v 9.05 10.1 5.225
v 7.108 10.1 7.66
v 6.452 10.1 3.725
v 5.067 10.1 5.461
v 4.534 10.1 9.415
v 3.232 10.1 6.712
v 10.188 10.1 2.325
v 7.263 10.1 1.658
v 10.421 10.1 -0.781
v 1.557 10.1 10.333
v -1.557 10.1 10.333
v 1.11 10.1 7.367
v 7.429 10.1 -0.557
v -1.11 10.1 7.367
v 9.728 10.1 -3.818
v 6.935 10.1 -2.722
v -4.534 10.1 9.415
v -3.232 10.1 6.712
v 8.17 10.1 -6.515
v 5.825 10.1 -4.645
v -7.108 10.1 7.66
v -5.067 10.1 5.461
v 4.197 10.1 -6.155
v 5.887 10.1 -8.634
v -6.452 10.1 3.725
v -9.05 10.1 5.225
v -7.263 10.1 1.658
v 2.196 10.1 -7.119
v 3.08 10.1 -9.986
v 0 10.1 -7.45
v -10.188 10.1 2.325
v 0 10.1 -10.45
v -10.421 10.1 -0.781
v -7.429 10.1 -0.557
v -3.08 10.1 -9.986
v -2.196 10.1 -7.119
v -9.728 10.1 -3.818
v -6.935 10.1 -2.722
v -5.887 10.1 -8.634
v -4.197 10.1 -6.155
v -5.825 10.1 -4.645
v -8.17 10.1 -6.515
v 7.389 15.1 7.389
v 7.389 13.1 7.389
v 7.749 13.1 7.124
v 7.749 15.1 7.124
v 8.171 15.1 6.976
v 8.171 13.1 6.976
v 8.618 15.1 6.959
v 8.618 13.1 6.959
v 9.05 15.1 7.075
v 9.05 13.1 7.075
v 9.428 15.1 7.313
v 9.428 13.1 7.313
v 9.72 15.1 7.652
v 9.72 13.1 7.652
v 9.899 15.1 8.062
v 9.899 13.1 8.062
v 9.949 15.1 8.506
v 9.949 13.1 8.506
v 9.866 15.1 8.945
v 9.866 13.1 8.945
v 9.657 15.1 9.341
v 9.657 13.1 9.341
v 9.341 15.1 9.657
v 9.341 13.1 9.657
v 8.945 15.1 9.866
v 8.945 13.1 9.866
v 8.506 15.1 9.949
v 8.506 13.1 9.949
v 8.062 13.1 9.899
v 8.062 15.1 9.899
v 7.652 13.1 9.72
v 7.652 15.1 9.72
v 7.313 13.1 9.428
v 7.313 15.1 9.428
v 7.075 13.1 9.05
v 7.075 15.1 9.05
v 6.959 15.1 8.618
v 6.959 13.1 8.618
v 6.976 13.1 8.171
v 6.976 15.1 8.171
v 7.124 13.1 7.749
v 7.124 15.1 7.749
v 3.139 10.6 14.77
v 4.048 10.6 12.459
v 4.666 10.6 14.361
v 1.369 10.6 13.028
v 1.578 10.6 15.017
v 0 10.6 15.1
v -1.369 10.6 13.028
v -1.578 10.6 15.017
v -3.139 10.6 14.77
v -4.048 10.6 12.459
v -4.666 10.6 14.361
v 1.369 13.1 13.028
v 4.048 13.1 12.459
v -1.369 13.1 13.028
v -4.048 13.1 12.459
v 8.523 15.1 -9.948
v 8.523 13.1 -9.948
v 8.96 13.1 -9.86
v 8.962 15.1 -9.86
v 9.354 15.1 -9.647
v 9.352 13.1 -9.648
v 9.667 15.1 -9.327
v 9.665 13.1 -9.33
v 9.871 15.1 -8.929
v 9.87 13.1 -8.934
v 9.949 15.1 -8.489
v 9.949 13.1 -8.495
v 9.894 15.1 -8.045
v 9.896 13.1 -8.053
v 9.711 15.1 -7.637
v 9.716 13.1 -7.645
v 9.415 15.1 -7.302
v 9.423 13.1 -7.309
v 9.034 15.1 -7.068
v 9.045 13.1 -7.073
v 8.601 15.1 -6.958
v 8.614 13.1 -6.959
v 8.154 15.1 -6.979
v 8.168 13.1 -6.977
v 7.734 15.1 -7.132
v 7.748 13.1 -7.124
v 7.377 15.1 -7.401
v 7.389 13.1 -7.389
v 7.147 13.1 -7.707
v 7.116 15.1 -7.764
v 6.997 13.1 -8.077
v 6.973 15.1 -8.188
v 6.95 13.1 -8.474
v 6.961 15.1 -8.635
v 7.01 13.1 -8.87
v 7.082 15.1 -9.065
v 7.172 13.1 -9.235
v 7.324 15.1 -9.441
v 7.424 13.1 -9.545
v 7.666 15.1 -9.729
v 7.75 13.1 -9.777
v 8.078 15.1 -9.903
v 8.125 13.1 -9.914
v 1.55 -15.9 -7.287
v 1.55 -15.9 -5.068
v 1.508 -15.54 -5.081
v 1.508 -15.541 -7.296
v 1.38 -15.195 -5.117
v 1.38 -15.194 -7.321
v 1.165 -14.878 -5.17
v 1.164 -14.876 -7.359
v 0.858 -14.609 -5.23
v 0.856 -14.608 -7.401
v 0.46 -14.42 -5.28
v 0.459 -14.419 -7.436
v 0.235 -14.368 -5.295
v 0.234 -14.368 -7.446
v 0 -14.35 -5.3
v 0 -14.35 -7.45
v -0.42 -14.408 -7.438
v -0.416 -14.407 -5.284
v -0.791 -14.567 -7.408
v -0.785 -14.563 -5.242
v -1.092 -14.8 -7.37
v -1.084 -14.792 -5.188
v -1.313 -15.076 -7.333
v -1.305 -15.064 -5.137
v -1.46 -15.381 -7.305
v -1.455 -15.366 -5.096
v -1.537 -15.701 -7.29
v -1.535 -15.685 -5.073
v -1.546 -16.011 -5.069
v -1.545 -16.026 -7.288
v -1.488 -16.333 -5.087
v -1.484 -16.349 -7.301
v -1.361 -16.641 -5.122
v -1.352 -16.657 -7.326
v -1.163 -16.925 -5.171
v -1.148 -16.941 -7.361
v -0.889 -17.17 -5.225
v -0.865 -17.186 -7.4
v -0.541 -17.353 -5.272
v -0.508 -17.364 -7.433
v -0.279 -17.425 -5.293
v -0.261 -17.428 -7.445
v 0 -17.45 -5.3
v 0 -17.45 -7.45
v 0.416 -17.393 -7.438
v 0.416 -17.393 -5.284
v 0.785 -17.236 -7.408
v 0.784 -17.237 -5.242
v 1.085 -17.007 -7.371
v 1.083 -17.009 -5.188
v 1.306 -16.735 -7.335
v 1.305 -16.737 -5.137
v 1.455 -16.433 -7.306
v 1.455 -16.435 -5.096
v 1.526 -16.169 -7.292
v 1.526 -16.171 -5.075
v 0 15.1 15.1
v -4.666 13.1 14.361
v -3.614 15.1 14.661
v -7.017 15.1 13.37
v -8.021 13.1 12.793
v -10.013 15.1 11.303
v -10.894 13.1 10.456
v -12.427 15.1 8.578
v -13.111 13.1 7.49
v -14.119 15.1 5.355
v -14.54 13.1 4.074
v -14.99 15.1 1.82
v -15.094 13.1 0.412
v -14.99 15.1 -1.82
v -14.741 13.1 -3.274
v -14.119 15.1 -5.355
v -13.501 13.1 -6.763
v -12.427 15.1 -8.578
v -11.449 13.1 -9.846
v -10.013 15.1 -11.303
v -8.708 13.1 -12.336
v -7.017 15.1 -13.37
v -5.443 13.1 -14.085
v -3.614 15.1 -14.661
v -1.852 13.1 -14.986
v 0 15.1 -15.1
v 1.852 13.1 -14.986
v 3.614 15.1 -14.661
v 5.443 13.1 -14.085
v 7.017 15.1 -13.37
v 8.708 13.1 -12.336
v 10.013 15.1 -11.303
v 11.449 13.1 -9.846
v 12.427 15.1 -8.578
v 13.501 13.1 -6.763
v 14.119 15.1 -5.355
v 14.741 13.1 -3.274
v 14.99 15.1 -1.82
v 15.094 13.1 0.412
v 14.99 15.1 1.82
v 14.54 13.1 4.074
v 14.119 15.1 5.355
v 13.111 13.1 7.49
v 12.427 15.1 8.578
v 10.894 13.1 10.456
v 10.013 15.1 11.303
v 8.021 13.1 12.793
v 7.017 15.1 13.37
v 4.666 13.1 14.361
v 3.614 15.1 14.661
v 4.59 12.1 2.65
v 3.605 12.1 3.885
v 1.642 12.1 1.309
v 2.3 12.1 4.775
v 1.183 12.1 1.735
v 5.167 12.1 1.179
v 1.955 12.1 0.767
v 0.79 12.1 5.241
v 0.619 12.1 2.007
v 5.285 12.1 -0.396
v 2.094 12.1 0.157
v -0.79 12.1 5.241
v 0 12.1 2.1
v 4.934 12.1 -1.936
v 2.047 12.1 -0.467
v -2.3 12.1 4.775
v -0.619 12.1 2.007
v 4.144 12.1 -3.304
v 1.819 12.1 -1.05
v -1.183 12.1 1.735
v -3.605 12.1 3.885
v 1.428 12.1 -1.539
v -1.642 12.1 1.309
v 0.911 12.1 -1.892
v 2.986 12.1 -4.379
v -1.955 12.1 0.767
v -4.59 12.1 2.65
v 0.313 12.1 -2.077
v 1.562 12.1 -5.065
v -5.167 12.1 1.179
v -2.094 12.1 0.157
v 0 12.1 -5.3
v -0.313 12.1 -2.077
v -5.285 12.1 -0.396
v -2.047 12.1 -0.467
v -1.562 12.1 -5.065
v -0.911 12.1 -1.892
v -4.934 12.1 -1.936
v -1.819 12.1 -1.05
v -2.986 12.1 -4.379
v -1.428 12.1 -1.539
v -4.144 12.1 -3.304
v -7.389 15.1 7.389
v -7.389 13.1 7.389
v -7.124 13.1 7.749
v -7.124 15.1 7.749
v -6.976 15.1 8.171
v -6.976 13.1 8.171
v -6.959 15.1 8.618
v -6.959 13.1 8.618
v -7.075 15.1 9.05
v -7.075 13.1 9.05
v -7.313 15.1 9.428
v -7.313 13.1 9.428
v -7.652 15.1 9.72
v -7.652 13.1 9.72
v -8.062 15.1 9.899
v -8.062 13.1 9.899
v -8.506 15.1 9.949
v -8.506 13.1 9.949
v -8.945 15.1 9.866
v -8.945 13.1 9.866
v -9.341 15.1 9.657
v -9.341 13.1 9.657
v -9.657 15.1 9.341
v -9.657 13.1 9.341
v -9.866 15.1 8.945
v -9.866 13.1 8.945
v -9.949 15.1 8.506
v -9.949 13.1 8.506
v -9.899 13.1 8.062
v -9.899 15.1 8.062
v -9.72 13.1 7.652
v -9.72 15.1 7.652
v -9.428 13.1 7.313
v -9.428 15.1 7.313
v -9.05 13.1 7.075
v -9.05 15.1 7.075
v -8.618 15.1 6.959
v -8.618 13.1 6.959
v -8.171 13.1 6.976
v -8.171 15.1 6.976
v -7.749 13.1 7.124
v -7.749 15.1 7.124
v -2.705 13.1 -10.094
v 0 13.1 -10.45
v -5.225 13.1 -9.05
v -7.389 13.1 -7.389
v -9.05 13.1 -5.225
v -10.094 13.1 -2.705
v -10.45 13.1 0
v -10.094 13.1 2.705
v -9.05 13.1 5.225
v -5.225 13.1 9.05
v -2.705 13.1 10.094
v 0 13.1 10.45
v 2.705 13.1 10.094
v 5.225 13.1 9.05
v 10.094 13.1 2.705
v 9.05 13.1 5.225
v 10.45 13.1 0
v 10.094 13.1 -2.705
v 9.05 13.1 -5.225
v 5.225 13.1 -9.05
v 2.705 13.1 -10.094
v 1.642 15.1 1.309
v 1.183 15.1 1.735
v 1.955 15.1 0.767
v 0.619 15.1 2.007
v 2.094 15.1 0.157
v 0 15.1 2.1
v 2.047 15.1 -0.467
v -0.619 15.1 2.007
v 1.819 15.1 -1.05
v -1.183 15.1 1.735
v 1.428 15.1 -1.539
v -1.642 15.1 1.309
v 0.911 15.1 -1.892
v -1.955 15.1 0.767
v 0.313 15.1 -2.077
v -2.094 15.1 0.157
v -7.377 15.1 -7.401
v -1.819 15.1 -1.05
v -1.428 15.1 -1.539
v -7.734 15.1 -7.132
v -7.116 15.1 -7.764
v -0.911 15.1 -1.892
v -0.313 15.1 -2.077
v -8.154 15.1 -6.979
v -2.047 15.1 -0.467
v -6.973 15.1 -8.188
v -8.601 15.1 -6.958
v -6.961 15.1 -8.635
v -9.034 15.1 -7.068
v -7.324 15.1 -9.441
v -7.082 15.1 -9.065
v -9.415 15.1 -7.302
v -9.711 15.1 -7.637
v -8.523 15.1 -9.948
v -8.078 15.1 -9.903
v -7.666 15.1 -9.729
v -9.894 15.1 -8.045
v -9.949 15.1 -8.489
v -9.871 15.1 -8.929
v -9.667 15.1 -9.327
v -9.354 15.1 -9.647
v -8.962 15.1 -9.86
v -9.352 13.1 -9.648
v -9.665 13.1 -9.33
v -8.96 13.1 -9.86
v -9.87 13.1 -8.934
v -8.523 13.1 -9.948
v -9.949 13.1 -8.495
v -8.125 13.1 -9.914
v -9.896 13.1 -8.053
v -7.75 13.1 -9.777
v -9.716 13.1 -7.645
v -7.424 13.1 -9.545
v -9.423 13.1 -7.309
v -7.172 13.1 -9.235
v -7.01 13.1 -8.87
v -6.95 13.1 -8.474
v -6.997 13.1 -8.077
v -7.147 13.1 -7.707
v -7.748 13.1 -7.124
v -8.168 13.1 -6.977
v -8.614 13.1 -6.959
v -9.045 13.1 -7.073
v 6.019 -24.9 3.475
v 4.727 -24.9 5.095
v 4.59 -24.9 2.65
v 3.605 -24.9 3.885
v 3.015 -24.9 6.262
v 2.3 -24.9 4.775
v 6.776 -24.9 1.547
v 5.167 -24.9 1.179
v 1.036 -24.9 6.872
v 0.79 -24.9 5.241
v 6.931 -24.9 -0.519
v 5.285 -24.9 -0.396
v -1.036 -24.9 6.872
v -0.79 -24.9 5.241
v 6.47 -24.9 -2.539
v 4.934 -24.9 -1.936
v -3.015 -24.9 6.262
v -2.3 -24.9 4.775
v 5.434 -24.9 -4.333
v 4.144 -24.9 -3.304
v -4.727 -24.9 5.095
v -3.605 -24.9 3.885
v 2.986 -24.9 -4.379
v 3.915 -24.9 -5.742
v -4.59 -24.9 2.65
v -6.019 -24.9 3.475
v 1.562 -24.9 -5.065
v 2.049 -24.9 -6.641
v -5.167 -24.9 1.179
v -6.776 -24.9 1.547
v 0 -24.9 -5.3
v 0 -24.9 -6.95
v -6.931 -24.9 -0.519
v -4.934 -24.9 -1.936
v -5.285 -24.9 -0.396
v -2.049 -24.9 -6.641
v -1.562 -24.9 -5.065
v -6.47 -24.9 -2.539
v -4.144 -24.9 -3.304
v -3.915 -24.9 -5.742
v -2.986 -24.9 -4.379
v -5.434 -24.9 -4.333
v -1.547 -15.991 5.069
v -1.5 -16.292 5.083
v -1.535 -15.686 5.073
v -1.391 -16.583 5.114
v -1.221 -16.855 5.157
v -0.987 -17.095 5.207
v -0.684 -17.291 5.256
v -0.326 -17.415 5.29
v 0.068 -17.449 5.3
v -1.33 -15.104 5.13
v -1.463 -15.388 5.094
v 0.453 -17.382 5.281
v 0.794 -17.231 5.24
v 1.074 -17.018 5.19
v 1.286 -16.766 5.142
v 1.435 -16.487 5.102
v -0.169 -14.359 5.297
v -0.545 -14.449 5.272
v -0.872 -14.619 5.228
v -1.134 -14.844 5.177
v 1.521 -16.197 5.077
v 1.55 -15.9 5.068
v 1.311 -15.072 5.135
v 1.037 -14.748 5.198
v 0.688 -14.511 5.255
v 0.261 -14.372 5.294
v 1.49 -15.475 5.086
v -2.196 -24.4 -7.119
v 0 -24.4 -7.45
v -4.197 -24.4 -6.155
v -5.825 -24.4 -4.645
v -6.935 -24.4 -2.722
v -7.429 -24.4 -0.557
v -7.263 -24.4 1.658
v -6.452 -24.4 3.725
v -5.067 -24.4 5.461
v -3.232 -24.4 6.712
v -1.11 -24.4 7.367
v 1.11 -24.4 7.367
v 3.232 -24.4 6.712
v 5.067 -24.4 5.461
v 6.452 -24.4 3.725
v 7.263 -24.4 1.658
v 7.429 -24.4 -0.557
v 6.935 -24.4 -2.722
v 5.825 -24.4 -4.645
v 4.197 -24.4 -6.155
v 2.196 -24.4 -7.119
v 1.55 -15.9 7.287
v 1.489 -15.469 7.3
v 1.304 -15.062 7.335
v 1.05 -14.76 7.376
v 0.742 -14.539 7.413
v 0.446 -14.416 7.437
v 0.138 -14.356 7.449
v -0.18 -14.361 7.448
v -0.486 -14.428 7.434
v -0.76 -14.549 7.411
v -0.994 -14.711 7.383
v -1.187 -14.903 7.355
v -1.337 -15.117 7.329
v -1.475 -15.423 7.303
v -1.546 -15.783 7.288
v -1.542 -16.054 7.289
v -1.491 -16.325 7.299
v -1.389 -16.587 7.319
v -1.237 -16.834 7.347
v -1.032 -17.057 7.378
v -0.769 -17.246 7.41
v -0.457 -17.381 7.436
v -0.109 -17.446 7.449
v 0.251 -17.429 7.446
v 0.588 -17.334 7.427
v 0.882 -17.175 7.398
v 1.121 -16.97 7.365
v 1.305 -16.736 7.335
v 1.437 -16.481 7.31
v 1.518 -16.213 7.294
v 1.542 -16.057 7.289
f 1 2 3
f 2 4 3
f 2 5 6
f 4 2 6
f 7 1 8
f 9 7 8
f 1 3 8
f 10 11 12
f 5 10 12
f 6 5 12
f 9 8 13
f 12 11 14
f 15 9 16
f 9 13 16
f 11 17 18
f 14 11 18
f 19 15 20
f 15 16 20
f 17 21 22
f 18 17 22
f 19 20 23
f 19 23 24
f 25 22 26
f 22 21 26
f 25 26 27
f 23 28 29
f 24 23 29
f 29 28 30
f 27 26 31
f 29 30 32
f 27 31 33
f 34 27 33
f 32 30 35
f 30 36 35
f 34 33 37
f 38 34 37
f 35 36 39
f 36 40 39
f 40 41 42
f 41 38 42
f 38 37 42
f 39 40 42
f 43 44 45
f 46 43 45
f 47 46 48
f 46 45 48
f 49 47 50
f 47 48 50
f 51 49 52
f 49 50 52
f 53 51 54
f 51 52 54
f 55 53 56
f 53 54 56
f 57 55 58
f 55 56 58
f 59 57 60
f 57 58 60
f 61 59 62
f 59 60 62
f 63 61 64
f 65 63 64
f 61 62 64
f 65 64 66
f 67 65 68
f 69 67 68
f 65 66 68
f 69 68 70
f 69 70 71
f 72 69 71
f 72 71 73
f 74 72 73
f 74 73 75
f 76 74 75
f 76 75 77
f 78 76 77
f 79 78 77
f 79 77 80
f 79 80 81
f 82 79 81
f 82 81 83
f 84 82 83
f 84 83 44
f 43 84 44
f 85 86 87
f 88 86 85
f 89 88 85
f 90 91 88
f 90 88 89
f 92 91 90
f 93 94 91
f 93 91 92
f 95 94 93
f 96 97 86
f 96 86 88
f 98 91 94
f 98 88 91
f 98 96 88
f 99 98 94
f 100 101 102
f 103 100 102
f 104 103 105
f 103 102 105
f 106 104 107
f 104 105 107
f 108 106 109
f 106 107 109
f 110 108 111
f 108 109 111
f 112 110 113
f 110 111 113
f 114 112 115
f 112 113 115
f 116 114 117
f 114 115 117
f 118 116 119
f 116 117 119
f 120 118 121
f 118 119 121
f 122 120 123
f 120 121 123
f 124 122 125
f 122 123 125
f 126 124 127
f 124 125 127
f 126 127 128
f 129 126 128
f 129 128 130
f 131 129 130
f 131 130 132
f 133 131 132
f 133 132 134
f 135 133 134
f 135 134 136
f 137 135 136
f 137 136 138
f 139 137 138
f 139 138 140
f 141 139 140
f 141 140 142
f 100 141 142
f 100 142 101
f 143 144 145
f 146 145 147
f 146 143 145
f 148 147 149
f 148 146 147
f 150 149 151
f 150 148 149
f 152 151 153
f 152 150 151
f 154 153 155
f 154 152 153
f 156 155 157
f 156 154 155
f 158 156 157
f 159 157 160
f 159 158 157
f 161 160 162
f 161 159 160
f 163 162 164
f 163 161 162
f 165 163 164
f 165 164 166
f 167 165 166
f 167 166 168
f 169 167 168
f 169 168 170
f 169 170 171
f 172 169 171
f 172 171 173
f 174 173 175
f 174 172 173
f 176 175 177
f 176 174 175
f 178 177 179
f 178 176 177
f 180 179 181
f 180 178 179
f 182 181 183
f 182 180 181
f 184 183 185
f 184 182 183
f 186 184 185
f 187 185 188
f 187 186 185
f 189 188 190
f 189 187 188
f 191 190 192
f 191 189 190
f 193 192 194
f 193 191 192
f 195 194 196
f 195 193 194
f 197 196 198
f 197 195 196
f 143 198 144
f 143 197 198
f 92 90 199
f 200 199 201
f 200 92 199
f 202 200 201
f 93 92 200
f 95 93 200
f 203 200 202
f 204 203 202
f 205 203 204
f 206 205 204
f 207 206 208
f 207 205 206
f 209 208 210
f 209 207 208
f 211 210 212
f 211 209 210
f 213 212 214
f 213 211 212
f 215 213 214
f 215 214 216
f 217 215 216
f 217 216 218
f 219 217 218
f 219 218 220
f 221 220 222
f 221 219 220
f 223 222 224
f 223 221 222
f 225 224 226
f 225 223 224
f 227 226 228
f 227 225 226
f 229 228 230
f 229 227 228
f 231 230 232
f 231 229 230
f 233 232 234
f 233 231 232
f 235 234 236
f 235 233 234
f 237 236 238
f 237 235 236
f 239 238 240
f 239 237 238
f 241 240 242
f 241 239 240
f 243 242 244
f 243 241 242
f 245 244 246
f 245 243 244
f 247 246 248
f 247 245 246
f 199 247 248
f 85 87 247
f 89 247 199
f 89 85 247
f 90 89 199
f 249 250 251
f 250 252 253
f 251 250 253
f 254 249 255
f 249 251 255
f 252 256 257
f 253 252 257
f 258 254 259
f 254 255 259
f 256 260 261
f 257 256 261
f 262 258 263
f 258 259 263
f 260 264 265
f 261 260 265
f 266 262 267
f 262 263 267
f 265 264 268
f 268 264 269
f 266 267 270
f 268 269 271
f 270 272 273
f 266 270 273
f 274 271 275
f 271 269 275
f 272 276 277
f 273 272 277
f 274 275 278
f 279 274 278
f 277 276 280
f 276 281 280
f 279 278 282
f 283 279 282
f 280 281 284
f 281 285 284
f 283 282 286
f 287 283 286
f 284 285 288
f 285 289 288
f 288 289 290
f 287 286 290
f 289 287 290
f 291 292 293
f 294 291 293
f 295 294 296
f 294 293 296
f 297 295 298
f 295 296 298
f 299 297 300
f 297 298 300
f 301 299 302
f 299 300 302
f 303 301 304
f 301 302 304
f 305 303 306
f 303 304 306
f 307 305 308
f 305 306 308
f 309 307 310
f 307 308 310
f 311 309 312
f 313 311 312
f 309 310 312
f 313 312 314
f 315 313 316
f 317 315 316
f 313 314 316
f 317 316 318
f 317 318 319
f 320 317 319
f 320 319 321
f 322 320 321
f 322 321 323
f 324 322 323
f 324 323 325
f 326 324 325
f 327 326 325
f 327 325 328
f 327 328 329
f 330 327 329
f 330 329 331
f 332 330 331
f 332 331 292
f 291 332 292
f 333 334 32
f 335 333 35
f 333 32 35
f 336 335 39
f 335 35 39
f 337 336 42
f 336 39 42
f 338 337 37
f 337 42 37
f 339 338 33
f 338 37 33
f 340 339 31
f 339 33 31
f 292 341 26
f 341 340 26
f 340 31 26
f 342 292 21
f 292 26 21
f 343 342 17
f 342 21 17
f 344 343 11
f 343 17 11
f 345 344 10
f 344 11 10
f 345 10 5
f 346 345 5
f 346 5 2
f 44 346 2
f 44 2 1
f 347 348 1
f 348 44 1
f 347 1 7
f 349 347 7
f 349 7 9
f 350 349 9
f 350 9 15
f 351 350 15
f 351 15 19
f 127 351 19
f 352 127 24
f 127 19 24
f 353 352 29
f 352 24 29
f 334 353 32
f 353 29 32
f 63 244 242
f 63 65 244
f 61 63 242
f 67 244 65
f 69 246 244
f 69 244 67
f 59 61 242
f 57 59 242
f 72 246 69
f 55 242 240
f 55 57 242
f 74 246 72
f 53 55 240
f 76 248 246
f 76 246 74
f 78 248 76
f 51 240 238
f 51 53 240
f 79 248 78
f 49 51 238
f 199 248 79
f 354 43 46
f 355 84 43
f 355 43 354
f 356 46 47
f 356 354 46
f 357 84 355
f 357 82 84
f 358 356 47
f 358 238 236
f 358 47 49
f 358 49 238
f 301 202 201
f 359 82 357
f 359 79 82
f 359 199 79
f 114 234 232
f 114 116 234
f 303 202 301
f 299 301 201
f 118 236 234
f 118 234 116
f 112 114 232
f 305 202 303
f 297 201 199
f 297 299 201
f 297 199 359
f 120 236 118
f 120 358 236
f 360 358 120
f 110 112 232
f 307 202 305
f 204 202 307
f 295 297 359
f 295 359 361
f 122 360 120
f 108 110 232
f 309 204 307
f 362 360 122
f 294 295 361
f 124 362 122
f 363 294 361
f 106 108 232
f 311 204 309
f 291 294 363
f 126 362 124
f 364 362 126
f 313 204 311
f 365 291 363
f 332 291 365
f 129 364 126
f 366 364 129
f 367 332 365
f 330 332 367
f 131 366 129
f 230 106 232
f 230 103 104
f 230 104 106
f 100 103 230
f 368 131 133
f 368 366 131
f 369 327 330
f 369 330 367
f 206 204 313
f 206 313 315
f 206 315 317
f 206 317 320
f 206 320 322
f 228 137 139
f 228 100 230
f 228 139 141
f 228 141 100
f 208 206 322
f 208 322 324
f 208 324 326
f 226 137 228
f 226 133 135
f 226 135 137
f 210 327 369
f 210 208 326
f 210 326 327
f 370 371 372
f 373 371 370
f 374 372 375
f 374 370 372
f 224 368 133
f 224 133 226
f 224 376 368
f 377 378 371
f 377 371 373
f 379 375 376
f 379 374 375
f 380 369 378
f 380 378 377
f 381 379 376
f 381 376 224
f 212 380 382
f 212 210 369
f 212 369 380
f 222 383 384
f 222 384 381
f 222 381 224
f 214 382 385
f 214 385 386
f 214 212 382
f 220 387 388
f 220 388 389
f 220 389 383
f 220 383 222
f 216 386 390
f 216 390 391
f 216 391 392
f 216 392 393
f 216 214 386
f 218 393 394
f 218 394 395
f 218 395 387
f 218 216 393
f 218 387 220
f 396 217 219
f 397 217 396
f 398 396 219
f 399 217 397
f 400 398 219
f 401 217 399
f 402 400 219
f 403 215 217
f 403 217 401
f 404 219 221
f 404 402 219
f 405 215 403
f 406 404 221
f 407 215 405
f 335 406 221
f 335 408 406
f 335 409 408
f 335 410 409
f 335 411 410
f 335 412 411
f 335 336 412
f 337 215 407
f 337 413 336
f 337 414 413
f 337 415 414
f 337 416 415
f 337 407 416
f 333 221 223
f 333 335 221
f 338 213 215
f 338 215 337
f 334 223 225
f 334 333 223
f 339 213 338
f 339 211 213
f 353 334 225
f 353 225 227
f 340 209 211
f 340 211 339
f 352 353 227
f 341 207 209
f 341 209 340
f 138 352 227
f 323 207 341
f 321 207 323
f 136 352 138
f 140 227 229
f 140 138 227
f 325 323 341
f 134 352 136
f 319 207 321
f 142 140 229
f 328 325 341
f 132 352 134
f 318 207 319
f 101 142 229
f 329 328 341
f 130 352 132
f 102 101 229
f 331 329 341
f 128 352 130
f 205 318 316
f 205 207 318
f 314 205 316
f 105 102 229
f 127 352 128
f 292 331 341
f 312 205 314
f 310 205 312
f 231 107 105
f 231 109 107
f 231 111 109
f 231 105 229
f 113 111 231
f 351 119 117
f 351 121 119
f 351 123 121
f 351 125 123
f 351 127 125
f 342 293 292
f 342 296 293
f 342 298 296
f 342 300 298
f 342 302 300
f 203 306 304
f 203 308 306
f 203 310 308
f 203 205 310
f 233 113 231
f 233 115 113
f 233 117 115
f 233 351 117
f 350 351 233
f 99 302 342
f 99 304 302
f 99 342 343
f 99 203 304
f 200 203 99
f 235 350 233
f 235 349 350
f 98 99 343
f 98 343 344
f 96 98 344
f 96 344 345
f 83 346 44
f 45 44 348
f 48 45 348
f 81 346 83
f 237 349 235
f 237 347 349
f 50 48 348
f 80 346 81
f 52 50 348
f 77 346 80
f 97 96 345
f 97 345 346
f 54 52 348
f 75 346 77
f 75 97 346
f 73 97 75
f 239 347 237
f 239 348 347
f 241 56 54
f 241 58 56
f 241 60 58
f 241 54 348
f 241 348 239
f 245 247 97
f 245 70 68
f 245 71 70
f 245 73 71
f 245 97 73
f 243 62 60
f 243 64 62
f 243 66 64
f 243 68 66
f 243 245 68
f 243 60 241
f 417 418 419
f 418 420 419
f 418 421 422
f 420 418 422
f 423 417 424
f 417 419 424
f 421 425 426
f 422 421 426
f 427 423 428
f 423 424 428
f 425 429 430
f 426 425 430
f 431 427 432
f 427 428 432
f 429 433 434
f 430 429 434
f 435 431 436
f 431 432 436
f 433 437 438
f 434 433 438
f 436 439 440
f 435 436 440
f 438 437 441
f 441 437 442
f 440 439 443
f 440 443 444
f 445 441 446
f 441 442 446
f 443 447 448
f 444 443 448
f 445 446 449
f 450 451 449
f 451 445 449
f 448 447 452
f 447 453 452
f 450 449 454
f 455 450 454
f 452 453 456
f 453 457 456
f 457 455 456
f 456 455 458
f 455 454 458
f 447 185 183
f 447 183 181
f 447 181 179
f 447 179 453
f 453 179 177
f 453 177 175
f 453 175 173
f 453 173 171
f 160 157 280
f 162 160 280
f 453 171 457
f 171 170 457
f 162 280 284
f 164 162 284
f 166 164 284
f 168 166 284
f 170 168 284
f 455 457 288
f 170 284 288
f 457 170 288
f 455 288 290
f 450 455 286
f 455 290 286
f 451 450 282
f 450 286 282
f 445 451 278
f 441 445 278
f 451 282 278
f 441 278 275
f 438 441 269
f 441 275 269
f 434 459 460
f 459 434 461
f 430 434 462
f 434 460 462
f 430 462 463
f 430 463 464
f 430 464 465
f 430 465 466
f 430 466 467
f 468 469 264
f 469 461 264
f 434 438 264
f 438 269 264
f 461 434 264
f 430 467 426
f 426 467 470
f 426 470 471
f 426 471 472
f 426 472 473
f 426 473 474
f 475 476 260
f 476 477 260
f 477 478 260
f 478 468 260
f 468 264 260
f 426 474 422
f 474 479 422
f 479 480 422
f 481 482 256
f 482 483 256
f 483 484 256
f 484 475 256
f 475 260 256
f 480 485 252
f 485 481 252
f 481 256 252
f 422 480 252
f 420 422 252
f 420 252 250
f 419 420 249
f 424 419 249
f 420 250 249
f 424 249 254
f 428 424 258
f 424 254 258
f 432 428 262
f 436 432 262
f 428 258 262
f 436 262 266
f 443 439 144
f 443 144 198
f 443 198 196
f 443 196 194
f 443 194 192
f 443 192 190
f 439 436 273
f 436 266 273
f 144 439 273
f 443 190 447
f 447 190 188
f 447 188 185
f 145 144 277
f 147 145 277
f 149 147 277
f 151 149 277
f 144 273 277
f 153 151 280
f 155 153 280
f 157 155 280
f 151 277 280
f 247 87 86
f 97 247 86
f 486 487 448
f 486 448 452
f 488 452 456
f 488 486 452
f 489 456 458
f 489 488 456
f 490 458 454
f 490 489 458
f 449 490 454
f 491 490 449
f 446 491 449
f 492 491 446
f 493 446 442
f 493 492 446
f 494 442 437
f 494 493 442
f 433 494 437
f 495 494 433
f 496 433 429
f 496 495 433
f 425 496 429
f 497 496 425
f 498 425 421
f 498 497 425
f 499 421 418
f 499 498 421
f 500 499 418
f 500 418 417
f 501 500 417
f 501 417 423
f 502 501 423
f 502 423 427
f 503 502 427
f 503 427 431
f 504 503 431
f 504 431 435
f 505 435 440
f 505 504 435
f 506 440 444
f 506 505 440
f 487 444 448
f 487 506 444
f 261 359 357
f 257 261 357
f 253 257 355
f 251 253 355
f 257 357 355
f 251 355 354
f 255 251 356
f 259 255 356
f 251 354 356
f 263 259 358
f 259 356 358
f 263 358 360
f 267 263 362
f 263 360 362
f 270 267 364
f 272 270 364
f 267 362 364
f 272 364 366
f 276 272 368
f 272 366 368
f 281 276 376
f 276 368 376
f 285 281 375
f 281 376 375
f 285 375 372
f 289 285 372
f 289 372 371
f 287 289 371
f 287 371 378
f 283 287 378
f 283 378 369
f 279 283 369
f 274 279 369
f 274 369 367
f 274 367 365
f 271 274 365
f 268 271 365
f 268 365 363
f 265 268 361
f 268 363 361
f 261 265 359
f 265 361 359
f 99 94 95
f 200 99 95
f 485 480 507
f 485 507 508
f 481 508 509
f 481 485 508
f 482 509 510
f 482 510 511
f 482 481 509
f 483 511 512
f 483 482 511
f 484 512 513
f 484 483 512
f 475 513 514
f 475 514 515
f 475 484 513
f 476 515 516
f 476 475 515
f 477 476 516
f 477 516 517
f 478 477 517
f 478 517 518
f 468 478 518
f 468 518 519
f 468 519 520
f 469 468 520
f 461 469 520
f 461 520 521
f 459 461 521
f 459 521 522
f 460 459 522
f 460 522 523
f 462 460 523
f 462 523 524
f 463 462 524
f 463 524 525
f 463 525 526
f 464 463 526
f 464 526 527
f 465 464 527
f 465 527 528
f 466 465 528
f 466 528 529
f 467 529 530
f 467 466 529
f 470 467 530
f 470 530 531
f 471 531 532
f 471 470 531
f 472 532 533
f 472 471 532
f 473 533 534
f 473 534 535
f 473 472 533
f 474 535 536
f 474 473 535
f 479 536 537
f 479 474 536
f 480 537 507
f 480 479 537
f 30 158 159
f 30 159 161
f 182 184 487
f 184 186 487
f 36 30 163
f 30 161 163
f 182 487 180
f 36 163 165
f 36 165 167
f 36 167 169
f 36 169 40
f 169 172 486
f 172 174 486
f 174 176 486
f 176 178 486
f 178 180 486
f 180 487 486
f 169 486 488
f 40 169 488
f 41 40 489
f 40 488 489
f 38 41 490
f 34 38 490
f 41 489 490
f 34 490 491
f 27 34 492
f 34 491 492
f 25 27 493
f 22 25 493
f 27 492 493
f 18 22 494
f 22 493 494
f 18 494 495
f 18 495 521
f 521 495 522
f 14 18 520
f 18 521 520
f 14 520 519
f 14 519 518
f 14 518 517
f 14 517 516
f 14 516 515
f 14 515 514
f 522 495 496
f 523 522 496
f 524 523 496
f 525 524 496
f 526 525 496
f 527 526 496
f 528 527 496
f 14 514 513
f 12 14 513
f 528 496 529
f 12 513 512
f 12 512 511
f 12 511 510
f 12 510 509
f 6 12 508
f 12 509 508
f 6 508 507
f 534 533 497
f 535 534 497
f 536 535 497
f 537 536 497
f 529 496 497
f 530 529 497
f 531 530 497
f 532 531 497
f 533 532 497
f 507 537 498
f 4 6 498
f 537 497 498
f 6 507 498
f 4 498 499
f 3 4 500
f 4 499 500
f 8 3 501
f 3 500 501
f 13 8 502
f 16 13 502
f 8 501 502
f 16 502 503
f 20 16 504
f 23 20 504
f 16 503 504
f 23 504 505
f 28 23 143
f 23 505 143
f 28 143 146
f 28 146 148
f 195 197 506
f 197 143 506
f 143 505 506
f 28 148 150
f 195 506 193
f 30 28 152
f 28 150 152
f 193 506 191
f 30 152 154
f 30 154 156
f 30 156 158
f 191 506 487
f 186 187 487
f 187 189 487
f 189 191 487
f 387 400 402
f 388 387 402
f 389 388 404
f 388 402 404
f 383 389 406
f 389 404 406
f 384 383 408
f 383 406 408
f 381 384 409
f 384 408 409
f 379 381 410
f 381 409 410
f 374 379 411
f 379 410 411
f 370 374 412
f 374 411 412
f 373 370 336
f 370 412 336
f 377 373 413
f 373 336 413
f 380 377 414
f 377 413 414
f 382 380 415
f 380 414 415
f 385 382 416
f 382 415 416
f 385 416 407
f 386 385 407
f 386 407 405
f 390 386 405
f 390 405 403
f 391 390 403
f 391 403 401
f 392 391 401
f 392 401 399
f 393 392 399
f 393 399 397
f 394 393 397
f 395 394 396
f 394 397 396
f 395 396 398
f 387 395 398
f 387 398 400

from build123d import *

# Parameters (mm, degrees)
CUT_EXTRUDE_1_DEPTH      = 29.955396734
CUT_EXTRUDE_1_DEPTH_BACK = 29.955396734
SKETCH_2_R               = 1.55
CHAMFER_1_SIZE           = 0.5
SKETCH_4_R               = 5.3
SKETCH_4_R_2             = 2.1
EXTRUDE_1_DEPTH          = 3
SKETCH_5_R               = 1.5
CUT_EXTRUDE_2_DEPTH      = 19
CUT_EXTRUDE_3_DEPTH      = 38


with BuildPart() as part:
    # 草图1 → 旋转1 (revolve)
    with BuildSketch(Plane.XY, mode=Mode.PRIVATE) as revolve_1_sk:
        Polygon((5.3, -24.9), (5.3, 15.1), (10.45, 15.1), (10.45, 10.1), (7.45, 10.1), (7.45, -24.9), align=None)
    revolve(revolve_1_sk.sketch.rotate(Axis((0, 0, 0), (0, 1, 0)), 90), axis=Axis((0, 0, 0), (0, 1, 0)))

    # 草图2 → 切除-拉伸1 (cut, two sides: drawn at the far end of the back side and taken through both)
    with BuildSketch(Plane.XY.offset(-CUT_EXTRUDE_1_DEPTH_BACK)):
        with Locations((0, -15.9)):
            Circle(SKETCH_2_R)
    extrude(amount=CUT_EXTRUDE_1_DEPTH + CUT_EXTRUDE_1_DEPTH_BACK, mode=Mode.SUBTRACT)

    # 倒角1
    chamfer_1_edges = [part.edges().sort_by_distance(p)[0] for p in [
        (0, -24.9, 7.45),
    ]]
    chamfer(chamfer_1_edges, length=CHAMFER_1_SIZE)

    # 草图3 → 旋转2 (revolve)
    with BuildSketch(Plane(origin=(0, 0, 0), x_dir=(0, 0, -1), z_dir=(1, 0, 0)), mode=Mode.PRIVATE) as revolve_2_sk:
        Polygon((10.45, 15.1), (15.1, 15.1), (15.1, 10.6), (13.1, 10.6), (13.1, 13.1), (10.409558261, 13.1), (10.409558261, 15.1), align=None)
    revolve(revolve_2_sk.sketch.rotate(Axis((0, 0, 0), (0, -1, 0)), 180), axis=Axis((0, 0, 0), (0, -1, 0)))

    # 草图4 → 凸台-拉伸1 (add)
    with BuildSketch(Plane(origin=(0, 15.1, 0), x_dir=(1, 0, 0), z_dir=(0, 1, 0))):
        with Locations(Location((0, 0, 0), (0, 0, 90))):
            Circle(SKETCH_4_R)
        with Locations(Location((0, 0, 0), (0, 0, 270))):
            Circle(SKETCH_4_R_2, mode=Mode.SUBTRACT)
    extrude(amount=-EXTRUDE_1_DEPTH)

    # 草图5 → 切除-拉伸2 (cut)
    with BuildSketch(Plane.XZ.offset(-10.1)):
        with Locations(Location((-8.449926035, 8.449926035, 0), (0, 0, 315))):
            Circle(SKETCH_5_R)
        with Locations(Location((8.449926035, 8.449926035, 0), (0, 0, 225))):
            Circle(SKETCH_5_R)
        with Locations(Location((8.449926035, -8.449926035, 0), (0, 0, 272.799179687))):
            Circle(SKETCH_5_R)
        with Locations(Location((-8.449926035, -8.449926035, 0), (0, 0, 267.200820313))):
            Circle(SKETCH_5_R)
    extrude(amount=-CUT_EXTRUDE_2_DEPTH, mode=Mode.SUBTRACT)

    # 草图7 → 切除-拉伸3 (cut)
    with BuildSketch(Plane.XZ.offset(24.9)):
        with BuildLine():
            Line((-3.229227591, 9.938540595), (-5.325886772, 16.39139404))
            ThreePointArc((-5.325886772, 16.39139404), (0, -17.234931636), (5.325886772, 16.39139404))
            Line((5.325886772, 16.39139404), (3.229227591, 9.938540595))
            ThreePointArc((3.229227591, 9.938540595), (0, -10.45), (-3.229227591, 9.938540595))
        make_face()
    extrude(amount=-CUT_EXTRUDE_3_DEPTH, mode=Mode.SUBTRACT)


solid = part.part
